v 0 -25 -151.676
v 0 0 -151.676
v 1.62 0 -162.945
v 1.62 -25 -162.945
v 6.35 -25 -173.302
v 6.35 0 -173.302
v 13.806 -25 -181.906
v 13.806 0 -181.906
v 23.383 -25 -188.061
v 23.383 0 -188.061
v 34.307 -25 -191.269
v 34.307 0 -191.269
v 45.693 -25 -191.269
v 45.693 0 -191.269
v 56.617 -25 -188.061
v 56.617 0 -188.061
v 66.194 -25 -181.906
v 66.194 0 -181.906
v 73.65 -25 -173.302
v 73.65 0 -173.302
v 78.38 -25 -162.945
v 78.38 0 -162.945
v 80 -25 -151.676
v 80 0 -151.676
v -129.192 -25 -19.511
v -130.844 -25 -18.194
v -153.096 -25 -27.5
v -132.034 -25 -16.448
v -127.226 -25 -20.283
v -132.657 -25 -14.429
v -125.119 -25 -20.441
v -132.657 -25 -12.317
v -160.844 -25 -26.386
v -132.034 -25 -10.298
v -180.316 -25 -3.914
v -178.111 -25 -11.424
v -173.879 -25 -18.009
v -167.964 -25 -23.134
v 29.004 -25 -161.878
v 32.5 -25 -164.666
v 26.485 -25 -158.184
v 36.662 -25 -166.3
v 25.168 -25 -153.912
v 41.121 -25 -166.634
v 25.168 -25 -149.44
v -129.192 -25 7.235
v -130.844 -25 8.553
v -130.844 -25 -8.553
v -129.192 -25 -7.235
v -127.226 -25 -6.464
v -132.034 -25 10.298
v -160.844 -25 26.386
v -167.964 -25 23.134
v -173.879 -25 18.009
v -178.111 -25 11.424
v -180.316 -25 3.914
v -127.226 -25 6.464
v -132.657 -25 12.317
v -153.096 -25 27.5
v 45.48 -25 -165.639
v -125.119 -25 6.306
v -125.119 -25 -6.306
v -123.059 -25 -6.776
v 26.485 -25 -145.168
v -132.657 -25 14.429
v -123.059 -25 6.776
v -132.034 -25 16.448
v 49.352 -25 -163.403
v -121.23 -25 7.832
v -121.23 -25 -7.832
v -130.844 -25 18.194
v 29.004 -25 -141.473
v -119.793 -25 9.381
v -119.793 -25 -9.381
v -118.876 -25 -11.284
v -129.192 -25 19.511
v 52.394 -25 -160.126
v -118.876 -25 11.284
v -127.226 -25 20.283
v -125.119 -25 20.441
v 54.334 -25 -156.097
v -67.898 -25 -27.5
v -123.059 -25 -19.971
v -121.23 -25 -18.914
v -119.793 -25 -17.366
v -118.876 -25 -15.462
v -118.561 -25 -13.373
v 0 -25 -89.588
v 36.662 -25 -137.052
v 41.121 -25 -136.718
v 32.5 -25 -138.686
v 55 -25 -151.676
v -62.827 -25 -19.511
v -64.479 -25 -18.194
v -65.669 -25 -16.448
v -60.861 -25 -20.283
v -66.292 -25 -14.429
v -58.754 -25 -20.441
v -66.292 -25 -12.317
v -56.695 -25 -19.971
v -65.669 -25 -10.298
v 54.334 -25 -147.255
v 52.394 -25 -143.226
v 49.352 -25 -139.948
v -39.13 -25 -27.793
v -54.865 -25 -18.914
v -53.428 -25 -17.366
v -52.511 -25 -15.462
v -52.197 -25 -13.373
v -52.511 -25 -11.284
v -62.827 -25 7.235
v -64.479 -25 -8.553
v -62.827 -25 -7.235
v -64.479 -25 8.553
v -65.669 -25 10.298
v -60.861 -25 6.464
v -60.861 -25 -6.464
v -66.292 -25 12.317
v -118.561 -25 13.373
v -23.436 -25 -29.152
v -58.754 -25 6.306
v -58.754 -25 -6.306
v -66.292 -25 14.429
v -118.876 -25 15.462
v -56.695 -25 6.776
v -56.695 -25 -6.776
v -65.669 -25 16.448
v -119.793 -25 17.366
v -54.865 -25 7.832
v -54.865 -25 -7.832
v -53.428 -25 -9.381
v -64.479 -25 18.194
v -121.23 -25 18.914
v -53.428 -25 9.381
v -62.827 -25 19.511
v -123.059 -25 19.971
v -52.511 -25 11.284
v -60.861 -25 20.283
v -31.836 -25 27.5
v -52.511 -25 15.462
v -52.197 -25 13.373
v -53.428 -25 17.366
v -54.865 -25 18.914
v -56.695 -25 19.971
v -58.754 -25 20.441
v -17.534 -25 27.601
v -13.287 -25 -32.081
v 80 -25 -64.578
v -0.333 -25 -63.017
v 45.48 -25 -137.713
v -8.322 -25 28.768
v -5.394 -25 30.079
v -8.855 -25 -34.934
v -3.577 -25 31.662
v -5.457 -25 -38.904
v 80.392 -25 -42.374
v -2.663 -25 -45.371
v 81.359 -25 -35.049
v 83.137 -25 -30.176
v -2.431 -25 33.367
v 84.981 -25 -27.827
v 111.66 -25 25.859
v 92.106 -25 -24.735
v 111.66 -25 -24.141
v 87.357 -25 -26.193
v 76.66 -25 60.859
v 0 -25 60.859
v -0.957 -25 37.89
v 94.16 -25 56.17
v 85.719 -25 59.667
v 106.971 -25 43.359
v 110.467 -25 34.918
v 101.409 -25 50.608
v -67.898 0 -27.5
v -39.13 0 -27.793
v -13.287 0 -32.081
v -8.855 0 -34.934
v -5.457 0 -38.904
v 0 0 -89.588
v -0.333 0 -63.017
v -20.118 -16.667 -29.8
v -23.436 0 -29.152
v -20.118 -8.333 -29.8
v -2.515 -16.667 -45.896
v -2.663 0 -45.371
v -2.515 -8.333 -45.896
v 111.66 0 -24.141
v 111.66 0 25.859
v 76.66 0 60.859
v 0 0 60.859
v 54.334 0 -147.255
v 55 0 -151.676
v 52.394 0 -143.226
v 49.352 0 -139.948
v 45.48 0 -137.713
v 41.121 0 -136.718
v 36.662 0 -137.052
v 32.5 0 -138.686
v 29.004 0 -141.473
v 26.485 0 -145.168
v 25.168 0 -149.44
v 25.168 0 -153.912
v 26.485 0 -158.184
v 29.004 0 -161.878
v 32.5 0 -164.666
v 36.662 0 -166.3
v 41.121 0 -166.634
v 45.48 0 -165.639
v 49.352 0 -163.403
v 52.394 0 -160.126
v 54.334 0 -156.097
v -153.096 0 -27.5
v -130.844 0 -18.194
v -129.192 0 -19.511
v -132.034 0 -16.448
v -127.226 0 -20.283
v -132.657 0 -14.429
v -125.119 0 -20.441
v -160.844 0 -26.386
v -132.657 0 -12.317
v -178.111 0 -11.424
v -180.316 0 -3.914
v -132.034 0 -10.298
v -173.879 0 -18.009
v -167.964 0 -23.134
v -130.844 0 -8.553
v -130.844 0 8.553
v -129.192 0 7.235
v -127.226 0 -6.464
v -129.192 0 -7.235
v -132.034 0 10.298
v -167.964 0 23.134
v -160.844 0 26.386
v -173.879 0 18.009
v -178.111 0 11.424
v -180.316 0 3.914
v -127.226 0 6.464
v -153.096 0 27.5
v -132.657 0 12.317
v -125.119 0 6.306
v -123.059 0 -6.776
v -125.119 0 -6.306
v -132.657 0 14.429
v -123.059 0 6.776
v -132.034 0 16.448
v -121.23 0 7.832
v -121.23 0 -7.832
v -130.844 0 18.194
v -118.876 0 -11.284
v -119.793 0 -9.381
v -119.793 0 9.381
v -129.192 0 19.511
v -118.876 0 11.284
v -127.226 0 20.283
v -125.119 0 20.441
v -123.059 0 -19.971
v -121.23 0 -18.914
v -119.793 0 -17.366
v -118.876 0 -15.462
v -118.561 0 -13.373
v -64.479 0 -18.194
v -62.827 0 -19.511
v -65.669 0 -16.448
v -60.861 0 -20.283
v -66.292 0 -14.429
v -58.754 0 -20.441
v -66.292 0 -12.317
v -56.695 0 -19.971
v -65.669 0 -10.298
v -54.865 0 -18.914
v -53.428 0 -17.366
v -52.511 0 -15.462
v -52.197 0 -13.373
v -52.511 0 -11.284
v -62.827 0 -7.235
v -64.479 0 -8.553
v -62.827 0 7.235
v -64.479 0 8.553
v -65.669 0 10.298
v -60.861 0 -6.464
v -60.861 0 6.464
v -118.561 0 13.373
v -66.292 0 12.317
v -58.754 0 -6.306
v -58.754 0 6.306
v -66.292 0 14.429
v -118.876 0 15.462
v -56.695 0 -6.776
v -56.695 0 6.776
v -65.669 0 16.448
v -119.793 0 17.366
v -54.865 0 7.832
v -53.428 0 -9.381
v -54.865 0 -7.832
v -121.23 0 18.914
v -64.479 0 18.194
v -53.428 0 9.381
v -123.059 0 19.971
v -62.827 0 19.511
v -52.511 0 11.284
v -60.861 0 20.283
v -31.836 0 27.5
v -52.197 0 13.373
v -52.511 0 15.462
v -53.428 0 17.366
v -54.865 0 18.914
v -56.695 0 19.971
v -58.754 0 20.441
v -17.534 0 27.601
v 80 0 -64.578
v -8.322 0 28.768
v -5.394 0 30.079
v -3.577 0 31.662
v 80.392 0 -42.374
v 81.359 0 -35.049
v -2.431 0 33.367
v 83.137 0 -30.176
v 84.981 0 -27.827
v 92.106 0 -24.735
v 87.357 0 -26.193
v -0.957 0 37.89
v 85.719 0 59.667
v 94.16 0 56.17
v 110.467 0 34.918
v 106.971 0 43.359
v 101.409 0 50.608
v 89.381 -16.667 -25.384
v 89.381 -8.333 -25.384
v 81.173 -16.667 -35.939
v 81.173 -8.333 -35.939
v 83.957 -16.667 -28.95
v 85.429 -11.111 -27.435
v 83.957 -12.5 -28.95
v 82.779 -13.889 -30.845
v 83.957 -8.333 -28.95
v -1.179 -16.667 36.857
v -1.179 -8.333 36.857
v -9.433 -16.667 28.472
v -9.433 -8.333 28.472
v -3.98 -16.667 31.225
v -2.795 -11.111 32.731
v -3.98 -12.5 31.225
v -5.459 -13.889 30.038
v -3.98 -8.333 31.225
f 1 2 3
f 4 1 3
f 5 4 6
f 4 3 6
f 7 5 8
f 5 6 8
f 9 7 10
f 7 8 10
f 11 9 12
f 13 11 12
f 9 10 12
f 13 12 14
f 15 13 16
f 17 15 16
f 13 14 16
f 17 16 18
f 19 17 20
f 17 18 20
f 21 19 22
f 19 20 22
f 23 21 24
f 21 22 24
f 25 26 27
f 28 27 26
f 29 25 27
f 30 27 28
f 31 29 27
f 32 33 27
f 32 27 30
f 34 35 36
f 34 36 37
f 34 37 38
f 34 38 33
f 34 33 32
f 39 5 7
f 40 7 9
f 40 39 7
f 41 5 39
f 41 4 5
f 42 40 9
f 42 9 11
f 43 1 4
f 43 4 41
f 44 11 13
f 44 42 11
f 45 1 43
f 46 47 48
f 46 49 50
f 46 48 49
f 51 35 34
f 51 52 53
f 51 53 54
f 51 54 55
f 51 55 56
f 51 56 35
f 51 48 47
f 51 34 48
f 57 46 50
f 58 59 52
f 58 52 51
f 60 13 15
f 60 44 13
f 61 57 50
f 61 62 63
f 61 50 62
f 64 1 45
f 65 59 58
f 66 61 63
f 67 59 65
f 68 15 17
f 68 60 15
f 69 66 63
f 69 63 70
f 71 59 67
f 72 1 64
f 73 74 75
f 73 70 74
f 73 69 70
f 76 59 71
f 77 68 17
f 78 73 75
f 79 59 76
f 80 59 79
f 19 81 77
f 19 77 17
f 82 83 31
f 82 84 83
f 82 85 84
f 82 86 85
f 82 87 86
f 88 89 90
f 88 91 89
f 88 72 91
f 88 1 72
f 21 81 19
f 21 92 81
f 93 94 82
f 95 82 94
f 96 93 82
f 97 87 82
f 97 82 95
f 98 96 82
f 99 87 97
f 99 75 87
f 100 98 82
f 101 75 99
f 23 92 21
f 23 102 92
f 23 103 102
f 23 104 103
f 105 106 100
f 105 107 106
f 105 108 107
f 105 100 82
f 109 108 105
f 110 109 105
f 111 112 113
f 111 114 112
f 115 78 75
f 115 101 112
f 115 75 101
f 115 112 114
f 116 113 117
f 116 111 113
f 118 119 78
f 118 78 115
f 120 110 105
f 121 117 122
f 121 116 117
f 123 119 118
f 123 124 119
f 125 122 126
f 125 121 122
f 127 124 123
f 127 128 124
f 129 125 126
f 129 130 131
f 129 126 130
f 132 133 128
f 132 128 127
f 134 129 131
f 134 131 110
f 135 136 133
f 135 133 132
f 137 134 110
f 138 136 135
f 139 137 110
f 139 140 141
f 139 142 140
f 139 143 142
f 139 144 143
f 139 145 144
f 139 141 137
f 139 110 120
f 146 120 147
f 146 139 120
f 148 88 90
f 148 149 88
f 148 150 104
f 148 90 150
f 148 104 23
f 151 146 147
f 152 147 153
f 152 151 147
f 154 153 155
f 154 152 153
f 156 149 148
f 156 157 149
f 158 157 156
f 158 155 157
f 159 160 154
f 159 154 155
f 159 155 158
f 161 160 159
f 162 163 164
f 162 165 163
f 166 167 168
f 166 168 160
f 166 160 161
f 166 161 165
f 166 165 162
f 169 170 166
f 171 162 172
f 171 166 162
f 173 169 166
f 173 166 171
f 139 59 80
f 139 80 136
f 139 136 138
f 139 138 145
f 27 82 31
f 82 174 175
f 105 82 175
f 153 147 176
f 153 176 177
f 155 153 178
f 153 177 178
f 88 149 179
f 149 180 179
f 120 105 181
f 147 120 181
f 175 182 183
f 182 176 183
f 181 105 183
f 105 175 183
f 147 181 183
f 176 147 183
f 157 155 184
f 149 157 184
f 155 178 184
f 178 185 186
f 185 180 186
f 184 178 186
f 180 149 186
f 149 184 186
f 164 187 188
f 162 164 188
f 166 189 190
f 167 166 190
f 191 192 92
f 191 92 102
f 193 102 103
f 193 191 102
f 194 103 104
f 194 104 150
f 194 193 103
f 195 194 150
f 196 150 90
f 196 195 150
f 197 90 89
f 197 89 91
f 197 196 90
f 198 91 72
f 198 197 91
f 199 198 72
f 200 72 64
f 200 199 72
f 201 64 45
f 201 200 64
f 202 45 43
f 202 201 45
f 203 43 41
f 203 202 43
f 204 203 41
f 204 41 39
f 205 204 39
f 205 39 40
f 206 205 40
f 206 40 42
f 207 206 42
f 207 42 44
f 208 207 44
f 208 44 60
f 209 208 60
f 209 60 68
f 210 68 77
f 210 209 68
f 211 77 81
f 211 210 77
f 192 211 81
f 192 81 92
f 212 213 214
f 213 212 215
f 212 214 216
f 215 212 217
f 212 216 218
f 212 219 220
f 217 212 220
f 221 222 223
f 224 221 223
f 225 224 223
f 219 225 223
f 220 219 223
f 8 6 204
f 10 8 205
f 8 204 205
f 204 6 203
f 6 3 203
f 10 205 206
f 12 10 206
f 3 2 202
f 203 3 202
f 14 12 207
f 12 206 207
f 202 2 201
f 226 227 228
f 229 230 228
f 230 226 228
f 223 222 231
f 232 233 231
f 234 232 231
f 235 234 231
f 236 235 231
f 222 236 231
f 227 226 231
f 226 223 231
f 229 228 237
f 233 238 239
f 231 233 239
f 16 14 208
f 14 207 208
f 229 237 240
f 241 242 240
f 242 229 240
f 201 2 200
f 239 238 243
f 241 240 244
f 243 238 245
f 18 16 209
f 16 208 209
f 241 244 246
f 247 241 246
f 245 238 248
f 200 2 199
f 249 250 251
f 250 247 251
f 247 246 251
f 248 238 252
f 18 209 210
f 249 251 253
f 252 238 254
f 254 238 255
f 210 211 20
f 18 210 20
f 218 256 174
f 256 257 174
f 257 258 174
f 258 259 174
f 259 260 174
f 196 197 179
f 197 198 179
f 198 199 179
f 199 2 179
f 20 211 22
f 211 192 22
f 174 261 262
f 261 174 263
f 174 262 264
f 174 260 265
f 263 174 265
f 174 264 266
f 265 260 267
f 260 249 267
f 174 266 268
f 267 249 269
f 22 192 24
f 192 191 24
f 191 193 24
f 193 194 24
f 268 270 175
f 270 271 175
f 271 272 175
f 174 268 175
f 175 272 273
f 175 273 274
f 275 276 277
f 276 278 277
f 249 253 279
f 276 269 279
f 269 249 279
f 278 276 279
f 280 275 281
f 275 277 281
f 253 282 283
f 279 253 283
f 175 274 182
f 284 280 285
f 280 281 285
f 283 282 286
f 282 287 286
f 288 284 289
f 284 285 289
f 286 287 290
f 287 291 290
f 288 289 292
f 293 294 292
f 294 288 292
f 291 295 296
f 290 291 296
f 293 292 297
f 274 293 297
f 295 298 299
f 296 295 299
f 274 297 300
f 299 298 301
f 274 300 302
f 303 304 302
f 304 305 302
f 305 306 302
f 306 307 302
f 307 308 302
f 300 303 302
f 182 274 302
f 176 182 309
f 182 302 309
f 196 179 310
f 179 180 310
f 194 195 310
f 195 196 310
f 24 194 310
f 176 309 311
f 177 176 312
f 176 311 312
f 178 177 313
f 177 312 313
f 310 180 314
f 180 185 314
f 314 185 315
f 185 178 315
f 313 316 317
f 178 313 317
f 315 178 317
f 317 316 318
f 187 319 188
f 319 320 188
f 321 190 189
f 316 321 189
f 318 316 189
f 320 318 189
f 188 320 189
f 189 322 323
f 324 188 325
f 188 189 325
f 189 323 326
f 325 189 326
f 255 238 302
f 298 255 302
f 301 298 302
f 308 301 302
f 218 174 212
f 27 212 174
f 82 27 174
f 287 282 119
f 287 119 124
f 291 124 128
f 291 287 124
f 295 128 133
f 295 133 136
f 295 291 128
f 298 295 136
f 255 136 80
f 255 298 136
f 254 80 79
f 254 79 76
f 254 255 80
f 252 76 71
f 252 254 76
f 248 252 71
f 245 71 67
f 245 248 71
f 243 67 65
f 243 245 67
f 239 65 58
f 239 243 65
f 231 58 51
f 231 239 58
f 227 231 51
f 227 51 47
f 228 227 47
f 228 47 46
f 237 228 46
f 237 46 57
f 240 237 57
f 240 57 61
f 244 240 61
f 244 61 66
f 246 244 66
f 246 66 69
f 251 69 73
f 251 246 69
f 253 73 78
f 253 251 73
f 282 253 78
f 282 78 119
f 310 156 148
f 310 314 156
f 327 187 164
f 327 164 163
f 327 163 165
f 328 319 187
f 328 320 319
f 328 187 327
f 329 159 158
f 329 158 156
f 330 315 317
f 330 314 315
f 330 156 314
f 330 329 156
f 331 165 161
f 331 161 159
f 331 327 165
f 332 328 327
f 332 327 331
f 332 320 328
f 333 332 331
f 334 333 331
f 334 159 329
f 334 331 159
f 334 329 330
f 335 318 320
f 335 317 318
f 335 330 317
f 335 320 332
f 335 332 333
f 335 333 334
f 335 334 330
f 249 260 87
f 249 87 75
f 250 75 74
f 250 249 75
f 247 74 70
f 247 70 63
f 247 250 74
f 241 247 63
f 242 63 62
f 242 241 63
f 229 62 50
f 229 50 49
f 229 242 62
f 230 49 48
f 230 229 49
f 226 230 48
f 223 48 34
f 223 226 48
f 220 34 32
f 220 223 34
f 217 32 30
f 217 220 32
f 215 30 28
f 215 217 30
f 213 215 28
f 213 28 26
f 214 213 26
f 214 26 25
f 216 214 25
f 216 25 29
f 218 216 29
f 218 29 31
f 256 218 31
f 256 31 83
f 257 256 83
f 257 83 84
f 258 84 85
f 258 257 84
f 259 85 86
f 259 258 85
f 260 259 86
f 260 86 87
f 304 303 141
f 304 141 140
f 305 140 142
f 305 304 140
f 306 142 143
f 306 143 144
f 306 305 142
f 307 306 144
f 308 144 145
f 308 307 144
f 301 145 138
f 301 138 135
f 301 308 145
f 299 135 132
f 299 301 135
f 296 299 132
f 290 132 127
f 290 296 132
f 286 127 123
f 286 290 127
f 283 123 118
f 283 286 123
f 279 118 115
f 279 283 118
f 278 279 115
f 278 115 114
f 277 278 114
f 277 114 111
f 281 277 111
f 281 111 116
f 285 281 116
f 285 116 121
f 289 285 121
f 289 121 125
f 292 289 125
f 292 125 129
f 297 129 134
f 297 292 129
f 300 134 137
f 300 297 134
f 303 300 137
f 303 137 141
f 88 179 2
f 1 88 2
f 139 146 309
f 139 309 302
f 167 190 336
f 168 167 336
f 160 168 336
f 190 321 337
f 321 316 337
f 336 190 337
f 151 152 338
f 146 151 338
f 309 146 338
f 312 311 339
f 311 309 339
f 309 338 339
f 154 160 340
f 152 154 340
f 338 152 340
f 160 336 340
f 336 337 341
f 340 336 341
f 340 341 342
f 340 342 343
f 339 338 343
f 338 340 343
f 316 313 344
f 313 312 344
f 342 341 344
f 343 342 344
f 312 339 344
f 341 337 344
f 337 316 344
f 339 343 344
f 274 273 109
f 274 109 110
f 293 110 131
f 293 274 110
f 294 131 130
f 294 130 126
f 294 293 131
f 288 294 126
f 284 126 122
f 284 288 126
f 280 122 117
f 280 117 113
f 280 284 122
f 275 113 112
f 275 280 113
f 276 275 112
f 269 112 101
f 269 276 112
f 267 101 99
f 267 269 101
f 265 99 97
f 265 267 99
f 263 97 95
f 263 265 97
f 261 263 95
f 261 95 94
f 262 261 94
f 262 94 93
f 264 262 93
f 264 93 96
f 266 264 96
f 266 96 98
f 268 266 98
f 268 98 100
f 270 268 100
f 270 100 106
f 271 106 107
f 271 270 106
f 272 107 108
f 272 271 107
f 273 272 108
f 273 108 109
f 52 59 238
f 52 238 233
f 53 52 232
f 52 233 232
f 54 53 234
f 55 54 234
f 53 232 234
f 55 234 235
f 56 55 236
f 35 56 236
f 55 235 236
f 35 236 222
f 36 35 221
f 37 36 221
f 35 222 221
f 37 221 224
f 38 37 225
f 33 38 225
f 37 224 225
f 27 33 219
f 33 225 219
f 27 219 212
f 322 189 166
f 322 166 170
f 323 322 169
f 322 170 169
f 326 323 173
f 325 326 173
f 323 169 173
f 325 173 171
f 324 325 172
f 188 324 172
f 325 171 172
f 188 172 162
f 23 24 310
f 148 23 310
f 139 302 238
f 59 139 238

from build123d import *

# Parameters (mm, degrees)
F0_R     = 15
F0_R_2   = 7.087313
F1_DEPTH = 25
F2_R     = 35


with BuildPart() as f1:
    # F0 (on Front) → F1 (new body)
    with BuildSketch(Plane.XZ):
        with BuildLine():
            add(Edge.make_bspline(
                [(0, 60.859382), (0, 26.312792), (0, 27.5), (-31.836466, 27.5)],
                knots=[0, 0, 0, 0, 46.113002, 46.113002, 46.113002, 46.113002], degree=3))
            Line((-31.836466, 27.5), (-153.096049, 27.5))
            ThreePointArc((-153.096049, 27.5), (-180.596049, 0), (-153.096049, -27.5))
            Line((-153.096049, -27.5), (-67.897924, -27.5))
            add(Edge.make_bspline(
                [(-67.897924, -27.5), (0, -27.5), (0, -27.5), (0, -89.587953)],
                knots=[0, 0, 0, 0, 92.005663, 92.005663, 92.005663, 92.005663], degree=3))
            Line((0, -89.587953), (0, -151.675906))
            ThreePointArc((0, -151.675906), (40, -191.675906), (80, -151.675906))
            Line((80, -151.675906), (80, -64.578305))
            add(Edge.make_bspline(
                [(111.659945, -24.140618), (80, -23.653816), (80, -23.971937), (80, -64.578305)],
                knots=[0, 0, 0, 0, 51.357167, 51.357167, 51.357167, 51.357167], degree=3))
            Line((111.659945, -24.140618), (111.659945, 60.859382))
            Line((111.659945, 60.859382), (0, 60.859382))
        make_face()
        with Locations((40, -151.675906)):
            Circle(F0_R, mode=Mode.SUBTRACT)
        with Locations((-125.648696, -13.373151)):
            Circle(F0_R_2, mode=Mode.SUBTRACT)
        with Locations((-59.283819, -13.373151)):
            Circle(F0_R_2, mode=Mode.SUBTRACT)
        with Locations((-125.648696, 13.373151)):
            Circle(F0_R_2, mode=Mode.SUBTRACT)
        with Locations((-59.283819, 13.373151)):
            Circle(F0_R_2, mode=Mode.SUBTRACT)
    extrude(amount=F1_DEPTH)

    # F2
    f2_edges = [f1.edges().sort_by_distance(p)[0] for p in [
        (111.659945, -12.5, 60.859382),
    ]]
    fillet(f2_edges, radius=F2_R)


solid = f1.part
